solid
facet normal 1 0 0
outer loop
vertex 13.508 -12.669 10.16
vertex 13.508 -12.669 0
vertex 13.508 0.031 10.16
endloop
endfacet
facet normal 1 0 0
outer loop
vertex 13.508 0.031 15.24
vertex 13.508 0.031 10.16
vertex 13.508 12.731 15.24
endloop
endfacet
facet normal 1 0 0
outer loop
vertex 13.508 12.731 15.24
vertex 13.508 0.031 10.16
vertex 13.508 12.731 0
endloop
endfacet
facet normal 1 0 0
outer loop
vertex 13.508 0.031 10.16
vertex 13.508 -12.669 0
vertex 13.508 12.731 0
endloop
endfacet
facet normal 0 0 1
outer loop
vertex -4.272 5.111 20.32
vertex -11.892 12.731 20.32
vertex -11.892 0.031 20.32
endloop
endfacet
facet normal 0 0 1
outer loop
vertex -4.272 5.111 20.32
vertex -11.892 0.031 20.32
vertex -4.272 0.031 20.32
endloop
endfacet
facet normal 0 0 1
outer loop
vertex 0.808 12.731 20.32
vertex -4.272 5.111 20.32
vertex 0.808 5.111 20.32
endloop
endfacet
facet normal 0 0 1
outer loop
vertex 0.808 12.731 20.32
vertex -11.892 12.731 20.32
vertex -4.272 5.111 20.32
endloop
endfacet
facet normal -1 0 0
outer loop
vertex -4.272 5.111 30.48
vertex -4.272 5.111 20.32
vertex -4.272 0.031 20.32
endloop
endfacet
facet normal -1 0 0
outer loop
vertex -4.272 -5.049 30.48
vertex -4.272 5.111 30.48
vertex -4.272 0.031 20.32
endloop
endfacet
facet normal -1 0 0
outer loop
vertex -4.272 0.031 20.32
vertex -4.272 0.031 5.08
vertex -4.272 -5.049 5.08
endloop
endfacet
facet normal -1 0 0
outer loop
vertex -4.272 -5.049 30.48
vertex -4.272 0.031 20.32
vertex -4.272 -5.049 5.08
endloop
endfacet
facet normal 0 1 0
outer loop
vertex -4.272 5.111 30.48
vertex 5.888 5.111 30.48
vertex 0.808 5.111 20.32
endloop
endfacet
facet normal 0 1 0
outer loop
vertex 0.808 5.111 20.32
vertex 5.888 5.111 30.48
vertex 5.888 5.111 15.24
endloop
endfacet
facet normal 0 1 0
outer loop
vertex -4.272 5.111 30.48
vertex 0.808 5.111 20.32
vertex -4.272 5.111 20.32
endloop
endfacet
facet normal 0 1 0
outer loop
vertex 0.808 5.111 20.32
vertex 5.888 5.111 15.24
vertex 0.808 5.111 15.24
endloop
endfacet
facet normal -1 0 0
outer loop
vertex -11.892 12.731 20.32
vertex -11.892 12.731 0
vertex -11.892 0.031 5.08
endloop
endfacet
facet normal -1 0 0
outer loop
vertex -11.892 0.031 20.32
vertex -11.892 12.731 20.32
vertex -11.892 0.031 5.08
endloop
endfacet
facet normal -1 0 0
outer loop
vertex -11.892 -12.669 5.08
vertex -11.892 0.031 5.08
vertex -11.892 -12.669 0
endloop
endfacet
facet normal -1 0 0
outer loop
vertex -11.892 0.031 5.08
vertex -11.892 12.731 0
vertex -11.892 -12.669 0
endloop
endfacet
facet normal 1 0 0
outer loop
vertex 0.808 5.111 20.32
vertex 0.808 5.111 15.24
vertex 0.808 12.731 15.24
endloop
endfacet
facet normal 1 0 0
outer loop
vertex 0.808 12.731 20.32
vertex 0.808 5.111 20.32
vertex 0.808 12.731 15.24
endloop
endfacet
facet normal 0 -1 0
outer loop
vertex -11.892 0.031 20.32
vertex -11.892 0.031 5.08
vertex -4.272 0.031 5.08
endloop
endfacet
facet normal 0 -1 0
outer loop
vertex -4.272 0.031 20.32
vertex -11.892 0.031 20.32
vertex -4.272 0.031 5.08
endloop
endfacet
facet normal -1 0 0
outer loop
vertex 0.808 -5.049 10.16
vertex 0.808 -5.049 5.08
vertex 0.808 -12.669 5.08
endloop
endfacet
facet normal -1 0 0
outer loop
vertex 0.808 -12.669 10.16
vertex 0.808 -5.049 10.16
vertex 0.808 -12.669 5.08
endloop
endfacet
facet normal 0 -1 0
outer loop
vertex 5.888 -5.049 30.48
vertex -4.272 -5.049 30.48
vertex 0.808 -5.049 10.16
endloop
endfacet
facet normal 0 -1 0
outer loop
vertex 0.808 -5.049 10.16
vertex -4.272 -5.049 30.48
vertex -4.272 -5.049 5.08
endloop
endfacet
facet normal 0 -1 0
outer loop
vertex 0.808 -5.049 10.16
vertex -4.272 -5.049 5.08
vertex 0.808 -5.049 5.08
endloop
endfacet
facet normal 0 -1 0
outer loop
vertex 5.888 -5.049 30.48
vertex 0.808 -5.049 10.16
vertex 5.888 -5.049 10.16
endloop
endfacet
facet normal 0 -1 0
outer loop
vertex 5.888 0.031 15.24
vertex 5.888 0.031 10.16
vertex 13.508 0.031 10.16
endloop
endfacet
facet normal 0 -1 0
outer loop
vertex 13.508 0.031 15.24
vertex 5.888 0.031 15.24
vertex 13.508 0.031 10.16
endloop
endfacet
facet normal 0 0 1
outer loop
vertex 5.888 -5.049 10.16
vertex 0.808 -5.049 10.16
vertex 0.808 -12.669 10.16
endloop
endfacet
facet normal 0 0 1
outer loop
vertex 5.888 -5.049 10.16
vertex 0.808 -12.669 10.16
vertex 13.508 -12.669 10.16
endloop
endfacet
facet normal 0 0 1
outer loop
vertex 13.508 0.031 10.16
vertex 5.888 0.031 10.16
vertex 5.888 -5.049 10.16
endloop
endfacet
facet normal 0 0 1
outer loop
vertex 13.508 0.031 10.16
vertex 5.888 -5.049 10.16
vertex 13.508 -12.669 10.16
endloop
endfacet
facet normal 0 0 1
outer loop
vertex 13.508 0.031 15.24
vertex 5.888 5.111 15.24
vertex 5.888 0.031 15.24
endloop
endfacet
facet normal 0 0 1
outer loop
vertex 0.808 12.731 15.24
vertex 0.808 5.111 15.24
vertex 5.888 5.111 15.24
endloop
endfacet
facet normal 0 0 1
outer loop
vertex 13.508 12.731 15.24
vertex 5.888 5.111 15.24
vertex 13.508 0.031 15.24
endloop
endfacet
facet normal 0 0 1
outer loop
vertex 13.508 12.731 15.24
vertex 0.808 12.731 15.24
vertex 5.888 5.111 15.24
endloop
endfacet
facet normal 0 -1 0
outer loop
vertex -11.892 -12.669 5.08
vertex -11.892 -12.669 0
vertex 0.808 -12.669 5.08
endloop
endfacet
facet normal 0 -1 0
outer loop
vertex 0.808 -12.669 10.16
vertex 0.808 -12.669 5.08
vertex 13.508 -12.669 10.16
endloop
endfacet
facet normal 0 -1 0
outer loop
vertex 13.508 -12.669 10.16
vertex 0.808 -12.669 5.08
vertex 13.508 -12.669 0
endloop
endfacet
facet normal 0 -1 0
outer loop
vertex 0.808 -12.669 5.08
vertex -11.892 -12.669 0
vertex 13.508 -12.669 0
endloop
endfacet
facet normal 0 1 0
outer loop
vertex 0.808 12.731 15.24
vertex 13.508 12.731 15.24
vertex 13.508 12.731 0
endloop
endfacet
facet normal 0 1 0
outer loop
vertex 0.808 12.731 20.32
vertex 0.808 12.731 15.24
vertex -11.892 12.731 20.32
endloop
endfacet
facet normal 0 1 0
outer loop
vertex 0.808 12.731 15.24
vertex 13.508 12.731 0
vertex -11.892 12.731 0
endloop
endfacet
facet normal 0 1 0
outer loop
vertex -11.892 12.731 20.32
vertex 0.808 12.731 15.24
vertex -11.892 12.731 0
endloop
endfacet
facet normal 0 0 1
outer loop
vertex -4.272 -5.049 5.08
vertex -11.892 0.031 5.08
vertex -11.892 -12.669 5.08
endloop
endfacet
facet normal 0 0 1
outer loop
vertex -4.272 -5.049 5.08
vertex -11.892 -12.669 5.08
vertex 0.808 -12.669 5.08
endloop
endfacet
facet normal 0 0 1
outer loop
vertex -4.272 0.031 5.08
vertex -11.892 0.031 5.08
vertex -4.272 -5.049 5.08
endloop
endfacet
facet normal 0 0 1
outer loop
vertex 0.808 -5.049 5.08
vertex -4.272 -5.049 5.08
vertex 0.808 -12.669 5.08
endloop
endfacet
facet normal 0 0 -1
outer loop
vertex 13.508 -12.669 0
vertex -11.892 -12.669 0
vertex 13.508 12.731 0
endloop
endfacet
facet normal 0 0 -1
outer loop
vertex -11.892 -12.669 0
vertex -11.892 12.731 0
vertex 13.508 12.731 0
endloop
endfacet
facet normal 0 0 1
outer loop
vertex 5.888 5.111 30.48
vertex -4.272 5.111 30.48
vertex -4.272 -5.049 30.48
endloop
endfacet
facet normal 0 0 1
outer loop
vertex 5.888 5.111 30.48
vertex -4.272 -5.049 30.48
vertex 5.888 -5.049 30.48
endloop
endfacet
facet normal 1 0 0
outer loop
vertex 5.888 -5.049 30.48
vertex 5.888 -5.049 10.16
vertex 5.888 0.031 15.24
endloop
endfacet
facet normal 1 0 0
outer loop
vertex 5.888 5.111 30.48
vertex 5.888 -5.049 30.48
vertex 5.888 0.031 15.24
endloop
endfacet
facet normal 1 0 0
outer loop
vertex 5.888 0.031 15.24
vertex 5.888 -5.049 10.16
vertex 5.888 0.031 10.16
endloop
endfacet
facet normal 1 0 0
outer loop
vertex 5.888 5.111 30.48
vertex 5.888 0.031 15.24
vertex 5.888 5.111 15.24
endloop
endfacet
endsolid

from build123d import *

# Parameters (mm, degrees)
F1_DEPTH  = 20.32
F2_DEPTH  = 15.24
F3_DEPTH  = 25.4
F4_DEPTH  = 10.16
F3_FACE_W = 10.16
F3_FACE_H = 10.16
F5_DEPTH  = 5.08


with BuildPart() as f1:
    # F0 (on Top) → F1 (new body)
    with BuildSketch(Plane.XY):
        Polygon((0.808182, 12.730596), (-9.351818, 12.730596), (-11.891818, 12.730596), (-11.891818, 10.190596), (-11.891818, 0.030596), (-4.271818, 0.030596), (-4.271818, 5.110596), (0.808182, 5.110596), align=None)
    extrude(amount=F1_DEPTH)

    # F0 (on Top) → F2 (join)
    with BuildSketch(Plane.XY):
        Polygon((10.968182, 12.730596), (0.808182, 12.730596), (0.808182, 5.110596), (5.888182, 5.110596), (5.888182, 0.030596), (13.508182, 0.030596), (13.508182, 10.190596), (13.508182, 12.730596), align=None)
    extrude(amount=F2_DEPTH)

    # F0 (on Top) → F3 (join)
    with BuildSketch(Plane.XY):
        Polygon((5.888182, 5.110596), (0.808182, 5.110596), (-4.271818, 5.110596), (-4.271818, 0.030596), (-4.271818, -5.049404), (0.808182, -5.049404), (5.888182, -5.049404), (5.888182, 0.030596), align=None)
    extrude(amount=F3_DEPTH)

    # F0 (on Top) → F4 (join)
    with BuildSketch(Plane.XY):
        Polygon((13.508182, 0.030596), (5.888182, 0.030596), (5.888182, -5.049404), (0.808182, -5.049404), (0.808182, -12.669404), (10.968182, -12.669404), (13.508182, -12.669404), (13.508182, -10.129404), align=None)
    extrude(amount=F4_DEPTH)

    # F0 (on Top) + F3_face (on face) → F5 (join)
    with BuildSketch(Plane.XY):
        Polygon((-4.271818, 0.030596), (-11.891818, 0.030596), (-11.891818, -10.129404), (-11.891818, -12.669404), (-9.351818, -12.669404), (0.808182, -12.669404), (0.808182, -5.049404), (-4.271818, -5.049404), align=None)
    with BuildSketch(Plane(origin=(0.808182, 0.030596, 25.4), x_dir=(1, 0, 0), z_dir=(0, 0, 1))):
        Rectangle(F3_FACE_W, F3_FACE_H)
    extrude(amount=F5_DEPTH)


solid = f1.part
